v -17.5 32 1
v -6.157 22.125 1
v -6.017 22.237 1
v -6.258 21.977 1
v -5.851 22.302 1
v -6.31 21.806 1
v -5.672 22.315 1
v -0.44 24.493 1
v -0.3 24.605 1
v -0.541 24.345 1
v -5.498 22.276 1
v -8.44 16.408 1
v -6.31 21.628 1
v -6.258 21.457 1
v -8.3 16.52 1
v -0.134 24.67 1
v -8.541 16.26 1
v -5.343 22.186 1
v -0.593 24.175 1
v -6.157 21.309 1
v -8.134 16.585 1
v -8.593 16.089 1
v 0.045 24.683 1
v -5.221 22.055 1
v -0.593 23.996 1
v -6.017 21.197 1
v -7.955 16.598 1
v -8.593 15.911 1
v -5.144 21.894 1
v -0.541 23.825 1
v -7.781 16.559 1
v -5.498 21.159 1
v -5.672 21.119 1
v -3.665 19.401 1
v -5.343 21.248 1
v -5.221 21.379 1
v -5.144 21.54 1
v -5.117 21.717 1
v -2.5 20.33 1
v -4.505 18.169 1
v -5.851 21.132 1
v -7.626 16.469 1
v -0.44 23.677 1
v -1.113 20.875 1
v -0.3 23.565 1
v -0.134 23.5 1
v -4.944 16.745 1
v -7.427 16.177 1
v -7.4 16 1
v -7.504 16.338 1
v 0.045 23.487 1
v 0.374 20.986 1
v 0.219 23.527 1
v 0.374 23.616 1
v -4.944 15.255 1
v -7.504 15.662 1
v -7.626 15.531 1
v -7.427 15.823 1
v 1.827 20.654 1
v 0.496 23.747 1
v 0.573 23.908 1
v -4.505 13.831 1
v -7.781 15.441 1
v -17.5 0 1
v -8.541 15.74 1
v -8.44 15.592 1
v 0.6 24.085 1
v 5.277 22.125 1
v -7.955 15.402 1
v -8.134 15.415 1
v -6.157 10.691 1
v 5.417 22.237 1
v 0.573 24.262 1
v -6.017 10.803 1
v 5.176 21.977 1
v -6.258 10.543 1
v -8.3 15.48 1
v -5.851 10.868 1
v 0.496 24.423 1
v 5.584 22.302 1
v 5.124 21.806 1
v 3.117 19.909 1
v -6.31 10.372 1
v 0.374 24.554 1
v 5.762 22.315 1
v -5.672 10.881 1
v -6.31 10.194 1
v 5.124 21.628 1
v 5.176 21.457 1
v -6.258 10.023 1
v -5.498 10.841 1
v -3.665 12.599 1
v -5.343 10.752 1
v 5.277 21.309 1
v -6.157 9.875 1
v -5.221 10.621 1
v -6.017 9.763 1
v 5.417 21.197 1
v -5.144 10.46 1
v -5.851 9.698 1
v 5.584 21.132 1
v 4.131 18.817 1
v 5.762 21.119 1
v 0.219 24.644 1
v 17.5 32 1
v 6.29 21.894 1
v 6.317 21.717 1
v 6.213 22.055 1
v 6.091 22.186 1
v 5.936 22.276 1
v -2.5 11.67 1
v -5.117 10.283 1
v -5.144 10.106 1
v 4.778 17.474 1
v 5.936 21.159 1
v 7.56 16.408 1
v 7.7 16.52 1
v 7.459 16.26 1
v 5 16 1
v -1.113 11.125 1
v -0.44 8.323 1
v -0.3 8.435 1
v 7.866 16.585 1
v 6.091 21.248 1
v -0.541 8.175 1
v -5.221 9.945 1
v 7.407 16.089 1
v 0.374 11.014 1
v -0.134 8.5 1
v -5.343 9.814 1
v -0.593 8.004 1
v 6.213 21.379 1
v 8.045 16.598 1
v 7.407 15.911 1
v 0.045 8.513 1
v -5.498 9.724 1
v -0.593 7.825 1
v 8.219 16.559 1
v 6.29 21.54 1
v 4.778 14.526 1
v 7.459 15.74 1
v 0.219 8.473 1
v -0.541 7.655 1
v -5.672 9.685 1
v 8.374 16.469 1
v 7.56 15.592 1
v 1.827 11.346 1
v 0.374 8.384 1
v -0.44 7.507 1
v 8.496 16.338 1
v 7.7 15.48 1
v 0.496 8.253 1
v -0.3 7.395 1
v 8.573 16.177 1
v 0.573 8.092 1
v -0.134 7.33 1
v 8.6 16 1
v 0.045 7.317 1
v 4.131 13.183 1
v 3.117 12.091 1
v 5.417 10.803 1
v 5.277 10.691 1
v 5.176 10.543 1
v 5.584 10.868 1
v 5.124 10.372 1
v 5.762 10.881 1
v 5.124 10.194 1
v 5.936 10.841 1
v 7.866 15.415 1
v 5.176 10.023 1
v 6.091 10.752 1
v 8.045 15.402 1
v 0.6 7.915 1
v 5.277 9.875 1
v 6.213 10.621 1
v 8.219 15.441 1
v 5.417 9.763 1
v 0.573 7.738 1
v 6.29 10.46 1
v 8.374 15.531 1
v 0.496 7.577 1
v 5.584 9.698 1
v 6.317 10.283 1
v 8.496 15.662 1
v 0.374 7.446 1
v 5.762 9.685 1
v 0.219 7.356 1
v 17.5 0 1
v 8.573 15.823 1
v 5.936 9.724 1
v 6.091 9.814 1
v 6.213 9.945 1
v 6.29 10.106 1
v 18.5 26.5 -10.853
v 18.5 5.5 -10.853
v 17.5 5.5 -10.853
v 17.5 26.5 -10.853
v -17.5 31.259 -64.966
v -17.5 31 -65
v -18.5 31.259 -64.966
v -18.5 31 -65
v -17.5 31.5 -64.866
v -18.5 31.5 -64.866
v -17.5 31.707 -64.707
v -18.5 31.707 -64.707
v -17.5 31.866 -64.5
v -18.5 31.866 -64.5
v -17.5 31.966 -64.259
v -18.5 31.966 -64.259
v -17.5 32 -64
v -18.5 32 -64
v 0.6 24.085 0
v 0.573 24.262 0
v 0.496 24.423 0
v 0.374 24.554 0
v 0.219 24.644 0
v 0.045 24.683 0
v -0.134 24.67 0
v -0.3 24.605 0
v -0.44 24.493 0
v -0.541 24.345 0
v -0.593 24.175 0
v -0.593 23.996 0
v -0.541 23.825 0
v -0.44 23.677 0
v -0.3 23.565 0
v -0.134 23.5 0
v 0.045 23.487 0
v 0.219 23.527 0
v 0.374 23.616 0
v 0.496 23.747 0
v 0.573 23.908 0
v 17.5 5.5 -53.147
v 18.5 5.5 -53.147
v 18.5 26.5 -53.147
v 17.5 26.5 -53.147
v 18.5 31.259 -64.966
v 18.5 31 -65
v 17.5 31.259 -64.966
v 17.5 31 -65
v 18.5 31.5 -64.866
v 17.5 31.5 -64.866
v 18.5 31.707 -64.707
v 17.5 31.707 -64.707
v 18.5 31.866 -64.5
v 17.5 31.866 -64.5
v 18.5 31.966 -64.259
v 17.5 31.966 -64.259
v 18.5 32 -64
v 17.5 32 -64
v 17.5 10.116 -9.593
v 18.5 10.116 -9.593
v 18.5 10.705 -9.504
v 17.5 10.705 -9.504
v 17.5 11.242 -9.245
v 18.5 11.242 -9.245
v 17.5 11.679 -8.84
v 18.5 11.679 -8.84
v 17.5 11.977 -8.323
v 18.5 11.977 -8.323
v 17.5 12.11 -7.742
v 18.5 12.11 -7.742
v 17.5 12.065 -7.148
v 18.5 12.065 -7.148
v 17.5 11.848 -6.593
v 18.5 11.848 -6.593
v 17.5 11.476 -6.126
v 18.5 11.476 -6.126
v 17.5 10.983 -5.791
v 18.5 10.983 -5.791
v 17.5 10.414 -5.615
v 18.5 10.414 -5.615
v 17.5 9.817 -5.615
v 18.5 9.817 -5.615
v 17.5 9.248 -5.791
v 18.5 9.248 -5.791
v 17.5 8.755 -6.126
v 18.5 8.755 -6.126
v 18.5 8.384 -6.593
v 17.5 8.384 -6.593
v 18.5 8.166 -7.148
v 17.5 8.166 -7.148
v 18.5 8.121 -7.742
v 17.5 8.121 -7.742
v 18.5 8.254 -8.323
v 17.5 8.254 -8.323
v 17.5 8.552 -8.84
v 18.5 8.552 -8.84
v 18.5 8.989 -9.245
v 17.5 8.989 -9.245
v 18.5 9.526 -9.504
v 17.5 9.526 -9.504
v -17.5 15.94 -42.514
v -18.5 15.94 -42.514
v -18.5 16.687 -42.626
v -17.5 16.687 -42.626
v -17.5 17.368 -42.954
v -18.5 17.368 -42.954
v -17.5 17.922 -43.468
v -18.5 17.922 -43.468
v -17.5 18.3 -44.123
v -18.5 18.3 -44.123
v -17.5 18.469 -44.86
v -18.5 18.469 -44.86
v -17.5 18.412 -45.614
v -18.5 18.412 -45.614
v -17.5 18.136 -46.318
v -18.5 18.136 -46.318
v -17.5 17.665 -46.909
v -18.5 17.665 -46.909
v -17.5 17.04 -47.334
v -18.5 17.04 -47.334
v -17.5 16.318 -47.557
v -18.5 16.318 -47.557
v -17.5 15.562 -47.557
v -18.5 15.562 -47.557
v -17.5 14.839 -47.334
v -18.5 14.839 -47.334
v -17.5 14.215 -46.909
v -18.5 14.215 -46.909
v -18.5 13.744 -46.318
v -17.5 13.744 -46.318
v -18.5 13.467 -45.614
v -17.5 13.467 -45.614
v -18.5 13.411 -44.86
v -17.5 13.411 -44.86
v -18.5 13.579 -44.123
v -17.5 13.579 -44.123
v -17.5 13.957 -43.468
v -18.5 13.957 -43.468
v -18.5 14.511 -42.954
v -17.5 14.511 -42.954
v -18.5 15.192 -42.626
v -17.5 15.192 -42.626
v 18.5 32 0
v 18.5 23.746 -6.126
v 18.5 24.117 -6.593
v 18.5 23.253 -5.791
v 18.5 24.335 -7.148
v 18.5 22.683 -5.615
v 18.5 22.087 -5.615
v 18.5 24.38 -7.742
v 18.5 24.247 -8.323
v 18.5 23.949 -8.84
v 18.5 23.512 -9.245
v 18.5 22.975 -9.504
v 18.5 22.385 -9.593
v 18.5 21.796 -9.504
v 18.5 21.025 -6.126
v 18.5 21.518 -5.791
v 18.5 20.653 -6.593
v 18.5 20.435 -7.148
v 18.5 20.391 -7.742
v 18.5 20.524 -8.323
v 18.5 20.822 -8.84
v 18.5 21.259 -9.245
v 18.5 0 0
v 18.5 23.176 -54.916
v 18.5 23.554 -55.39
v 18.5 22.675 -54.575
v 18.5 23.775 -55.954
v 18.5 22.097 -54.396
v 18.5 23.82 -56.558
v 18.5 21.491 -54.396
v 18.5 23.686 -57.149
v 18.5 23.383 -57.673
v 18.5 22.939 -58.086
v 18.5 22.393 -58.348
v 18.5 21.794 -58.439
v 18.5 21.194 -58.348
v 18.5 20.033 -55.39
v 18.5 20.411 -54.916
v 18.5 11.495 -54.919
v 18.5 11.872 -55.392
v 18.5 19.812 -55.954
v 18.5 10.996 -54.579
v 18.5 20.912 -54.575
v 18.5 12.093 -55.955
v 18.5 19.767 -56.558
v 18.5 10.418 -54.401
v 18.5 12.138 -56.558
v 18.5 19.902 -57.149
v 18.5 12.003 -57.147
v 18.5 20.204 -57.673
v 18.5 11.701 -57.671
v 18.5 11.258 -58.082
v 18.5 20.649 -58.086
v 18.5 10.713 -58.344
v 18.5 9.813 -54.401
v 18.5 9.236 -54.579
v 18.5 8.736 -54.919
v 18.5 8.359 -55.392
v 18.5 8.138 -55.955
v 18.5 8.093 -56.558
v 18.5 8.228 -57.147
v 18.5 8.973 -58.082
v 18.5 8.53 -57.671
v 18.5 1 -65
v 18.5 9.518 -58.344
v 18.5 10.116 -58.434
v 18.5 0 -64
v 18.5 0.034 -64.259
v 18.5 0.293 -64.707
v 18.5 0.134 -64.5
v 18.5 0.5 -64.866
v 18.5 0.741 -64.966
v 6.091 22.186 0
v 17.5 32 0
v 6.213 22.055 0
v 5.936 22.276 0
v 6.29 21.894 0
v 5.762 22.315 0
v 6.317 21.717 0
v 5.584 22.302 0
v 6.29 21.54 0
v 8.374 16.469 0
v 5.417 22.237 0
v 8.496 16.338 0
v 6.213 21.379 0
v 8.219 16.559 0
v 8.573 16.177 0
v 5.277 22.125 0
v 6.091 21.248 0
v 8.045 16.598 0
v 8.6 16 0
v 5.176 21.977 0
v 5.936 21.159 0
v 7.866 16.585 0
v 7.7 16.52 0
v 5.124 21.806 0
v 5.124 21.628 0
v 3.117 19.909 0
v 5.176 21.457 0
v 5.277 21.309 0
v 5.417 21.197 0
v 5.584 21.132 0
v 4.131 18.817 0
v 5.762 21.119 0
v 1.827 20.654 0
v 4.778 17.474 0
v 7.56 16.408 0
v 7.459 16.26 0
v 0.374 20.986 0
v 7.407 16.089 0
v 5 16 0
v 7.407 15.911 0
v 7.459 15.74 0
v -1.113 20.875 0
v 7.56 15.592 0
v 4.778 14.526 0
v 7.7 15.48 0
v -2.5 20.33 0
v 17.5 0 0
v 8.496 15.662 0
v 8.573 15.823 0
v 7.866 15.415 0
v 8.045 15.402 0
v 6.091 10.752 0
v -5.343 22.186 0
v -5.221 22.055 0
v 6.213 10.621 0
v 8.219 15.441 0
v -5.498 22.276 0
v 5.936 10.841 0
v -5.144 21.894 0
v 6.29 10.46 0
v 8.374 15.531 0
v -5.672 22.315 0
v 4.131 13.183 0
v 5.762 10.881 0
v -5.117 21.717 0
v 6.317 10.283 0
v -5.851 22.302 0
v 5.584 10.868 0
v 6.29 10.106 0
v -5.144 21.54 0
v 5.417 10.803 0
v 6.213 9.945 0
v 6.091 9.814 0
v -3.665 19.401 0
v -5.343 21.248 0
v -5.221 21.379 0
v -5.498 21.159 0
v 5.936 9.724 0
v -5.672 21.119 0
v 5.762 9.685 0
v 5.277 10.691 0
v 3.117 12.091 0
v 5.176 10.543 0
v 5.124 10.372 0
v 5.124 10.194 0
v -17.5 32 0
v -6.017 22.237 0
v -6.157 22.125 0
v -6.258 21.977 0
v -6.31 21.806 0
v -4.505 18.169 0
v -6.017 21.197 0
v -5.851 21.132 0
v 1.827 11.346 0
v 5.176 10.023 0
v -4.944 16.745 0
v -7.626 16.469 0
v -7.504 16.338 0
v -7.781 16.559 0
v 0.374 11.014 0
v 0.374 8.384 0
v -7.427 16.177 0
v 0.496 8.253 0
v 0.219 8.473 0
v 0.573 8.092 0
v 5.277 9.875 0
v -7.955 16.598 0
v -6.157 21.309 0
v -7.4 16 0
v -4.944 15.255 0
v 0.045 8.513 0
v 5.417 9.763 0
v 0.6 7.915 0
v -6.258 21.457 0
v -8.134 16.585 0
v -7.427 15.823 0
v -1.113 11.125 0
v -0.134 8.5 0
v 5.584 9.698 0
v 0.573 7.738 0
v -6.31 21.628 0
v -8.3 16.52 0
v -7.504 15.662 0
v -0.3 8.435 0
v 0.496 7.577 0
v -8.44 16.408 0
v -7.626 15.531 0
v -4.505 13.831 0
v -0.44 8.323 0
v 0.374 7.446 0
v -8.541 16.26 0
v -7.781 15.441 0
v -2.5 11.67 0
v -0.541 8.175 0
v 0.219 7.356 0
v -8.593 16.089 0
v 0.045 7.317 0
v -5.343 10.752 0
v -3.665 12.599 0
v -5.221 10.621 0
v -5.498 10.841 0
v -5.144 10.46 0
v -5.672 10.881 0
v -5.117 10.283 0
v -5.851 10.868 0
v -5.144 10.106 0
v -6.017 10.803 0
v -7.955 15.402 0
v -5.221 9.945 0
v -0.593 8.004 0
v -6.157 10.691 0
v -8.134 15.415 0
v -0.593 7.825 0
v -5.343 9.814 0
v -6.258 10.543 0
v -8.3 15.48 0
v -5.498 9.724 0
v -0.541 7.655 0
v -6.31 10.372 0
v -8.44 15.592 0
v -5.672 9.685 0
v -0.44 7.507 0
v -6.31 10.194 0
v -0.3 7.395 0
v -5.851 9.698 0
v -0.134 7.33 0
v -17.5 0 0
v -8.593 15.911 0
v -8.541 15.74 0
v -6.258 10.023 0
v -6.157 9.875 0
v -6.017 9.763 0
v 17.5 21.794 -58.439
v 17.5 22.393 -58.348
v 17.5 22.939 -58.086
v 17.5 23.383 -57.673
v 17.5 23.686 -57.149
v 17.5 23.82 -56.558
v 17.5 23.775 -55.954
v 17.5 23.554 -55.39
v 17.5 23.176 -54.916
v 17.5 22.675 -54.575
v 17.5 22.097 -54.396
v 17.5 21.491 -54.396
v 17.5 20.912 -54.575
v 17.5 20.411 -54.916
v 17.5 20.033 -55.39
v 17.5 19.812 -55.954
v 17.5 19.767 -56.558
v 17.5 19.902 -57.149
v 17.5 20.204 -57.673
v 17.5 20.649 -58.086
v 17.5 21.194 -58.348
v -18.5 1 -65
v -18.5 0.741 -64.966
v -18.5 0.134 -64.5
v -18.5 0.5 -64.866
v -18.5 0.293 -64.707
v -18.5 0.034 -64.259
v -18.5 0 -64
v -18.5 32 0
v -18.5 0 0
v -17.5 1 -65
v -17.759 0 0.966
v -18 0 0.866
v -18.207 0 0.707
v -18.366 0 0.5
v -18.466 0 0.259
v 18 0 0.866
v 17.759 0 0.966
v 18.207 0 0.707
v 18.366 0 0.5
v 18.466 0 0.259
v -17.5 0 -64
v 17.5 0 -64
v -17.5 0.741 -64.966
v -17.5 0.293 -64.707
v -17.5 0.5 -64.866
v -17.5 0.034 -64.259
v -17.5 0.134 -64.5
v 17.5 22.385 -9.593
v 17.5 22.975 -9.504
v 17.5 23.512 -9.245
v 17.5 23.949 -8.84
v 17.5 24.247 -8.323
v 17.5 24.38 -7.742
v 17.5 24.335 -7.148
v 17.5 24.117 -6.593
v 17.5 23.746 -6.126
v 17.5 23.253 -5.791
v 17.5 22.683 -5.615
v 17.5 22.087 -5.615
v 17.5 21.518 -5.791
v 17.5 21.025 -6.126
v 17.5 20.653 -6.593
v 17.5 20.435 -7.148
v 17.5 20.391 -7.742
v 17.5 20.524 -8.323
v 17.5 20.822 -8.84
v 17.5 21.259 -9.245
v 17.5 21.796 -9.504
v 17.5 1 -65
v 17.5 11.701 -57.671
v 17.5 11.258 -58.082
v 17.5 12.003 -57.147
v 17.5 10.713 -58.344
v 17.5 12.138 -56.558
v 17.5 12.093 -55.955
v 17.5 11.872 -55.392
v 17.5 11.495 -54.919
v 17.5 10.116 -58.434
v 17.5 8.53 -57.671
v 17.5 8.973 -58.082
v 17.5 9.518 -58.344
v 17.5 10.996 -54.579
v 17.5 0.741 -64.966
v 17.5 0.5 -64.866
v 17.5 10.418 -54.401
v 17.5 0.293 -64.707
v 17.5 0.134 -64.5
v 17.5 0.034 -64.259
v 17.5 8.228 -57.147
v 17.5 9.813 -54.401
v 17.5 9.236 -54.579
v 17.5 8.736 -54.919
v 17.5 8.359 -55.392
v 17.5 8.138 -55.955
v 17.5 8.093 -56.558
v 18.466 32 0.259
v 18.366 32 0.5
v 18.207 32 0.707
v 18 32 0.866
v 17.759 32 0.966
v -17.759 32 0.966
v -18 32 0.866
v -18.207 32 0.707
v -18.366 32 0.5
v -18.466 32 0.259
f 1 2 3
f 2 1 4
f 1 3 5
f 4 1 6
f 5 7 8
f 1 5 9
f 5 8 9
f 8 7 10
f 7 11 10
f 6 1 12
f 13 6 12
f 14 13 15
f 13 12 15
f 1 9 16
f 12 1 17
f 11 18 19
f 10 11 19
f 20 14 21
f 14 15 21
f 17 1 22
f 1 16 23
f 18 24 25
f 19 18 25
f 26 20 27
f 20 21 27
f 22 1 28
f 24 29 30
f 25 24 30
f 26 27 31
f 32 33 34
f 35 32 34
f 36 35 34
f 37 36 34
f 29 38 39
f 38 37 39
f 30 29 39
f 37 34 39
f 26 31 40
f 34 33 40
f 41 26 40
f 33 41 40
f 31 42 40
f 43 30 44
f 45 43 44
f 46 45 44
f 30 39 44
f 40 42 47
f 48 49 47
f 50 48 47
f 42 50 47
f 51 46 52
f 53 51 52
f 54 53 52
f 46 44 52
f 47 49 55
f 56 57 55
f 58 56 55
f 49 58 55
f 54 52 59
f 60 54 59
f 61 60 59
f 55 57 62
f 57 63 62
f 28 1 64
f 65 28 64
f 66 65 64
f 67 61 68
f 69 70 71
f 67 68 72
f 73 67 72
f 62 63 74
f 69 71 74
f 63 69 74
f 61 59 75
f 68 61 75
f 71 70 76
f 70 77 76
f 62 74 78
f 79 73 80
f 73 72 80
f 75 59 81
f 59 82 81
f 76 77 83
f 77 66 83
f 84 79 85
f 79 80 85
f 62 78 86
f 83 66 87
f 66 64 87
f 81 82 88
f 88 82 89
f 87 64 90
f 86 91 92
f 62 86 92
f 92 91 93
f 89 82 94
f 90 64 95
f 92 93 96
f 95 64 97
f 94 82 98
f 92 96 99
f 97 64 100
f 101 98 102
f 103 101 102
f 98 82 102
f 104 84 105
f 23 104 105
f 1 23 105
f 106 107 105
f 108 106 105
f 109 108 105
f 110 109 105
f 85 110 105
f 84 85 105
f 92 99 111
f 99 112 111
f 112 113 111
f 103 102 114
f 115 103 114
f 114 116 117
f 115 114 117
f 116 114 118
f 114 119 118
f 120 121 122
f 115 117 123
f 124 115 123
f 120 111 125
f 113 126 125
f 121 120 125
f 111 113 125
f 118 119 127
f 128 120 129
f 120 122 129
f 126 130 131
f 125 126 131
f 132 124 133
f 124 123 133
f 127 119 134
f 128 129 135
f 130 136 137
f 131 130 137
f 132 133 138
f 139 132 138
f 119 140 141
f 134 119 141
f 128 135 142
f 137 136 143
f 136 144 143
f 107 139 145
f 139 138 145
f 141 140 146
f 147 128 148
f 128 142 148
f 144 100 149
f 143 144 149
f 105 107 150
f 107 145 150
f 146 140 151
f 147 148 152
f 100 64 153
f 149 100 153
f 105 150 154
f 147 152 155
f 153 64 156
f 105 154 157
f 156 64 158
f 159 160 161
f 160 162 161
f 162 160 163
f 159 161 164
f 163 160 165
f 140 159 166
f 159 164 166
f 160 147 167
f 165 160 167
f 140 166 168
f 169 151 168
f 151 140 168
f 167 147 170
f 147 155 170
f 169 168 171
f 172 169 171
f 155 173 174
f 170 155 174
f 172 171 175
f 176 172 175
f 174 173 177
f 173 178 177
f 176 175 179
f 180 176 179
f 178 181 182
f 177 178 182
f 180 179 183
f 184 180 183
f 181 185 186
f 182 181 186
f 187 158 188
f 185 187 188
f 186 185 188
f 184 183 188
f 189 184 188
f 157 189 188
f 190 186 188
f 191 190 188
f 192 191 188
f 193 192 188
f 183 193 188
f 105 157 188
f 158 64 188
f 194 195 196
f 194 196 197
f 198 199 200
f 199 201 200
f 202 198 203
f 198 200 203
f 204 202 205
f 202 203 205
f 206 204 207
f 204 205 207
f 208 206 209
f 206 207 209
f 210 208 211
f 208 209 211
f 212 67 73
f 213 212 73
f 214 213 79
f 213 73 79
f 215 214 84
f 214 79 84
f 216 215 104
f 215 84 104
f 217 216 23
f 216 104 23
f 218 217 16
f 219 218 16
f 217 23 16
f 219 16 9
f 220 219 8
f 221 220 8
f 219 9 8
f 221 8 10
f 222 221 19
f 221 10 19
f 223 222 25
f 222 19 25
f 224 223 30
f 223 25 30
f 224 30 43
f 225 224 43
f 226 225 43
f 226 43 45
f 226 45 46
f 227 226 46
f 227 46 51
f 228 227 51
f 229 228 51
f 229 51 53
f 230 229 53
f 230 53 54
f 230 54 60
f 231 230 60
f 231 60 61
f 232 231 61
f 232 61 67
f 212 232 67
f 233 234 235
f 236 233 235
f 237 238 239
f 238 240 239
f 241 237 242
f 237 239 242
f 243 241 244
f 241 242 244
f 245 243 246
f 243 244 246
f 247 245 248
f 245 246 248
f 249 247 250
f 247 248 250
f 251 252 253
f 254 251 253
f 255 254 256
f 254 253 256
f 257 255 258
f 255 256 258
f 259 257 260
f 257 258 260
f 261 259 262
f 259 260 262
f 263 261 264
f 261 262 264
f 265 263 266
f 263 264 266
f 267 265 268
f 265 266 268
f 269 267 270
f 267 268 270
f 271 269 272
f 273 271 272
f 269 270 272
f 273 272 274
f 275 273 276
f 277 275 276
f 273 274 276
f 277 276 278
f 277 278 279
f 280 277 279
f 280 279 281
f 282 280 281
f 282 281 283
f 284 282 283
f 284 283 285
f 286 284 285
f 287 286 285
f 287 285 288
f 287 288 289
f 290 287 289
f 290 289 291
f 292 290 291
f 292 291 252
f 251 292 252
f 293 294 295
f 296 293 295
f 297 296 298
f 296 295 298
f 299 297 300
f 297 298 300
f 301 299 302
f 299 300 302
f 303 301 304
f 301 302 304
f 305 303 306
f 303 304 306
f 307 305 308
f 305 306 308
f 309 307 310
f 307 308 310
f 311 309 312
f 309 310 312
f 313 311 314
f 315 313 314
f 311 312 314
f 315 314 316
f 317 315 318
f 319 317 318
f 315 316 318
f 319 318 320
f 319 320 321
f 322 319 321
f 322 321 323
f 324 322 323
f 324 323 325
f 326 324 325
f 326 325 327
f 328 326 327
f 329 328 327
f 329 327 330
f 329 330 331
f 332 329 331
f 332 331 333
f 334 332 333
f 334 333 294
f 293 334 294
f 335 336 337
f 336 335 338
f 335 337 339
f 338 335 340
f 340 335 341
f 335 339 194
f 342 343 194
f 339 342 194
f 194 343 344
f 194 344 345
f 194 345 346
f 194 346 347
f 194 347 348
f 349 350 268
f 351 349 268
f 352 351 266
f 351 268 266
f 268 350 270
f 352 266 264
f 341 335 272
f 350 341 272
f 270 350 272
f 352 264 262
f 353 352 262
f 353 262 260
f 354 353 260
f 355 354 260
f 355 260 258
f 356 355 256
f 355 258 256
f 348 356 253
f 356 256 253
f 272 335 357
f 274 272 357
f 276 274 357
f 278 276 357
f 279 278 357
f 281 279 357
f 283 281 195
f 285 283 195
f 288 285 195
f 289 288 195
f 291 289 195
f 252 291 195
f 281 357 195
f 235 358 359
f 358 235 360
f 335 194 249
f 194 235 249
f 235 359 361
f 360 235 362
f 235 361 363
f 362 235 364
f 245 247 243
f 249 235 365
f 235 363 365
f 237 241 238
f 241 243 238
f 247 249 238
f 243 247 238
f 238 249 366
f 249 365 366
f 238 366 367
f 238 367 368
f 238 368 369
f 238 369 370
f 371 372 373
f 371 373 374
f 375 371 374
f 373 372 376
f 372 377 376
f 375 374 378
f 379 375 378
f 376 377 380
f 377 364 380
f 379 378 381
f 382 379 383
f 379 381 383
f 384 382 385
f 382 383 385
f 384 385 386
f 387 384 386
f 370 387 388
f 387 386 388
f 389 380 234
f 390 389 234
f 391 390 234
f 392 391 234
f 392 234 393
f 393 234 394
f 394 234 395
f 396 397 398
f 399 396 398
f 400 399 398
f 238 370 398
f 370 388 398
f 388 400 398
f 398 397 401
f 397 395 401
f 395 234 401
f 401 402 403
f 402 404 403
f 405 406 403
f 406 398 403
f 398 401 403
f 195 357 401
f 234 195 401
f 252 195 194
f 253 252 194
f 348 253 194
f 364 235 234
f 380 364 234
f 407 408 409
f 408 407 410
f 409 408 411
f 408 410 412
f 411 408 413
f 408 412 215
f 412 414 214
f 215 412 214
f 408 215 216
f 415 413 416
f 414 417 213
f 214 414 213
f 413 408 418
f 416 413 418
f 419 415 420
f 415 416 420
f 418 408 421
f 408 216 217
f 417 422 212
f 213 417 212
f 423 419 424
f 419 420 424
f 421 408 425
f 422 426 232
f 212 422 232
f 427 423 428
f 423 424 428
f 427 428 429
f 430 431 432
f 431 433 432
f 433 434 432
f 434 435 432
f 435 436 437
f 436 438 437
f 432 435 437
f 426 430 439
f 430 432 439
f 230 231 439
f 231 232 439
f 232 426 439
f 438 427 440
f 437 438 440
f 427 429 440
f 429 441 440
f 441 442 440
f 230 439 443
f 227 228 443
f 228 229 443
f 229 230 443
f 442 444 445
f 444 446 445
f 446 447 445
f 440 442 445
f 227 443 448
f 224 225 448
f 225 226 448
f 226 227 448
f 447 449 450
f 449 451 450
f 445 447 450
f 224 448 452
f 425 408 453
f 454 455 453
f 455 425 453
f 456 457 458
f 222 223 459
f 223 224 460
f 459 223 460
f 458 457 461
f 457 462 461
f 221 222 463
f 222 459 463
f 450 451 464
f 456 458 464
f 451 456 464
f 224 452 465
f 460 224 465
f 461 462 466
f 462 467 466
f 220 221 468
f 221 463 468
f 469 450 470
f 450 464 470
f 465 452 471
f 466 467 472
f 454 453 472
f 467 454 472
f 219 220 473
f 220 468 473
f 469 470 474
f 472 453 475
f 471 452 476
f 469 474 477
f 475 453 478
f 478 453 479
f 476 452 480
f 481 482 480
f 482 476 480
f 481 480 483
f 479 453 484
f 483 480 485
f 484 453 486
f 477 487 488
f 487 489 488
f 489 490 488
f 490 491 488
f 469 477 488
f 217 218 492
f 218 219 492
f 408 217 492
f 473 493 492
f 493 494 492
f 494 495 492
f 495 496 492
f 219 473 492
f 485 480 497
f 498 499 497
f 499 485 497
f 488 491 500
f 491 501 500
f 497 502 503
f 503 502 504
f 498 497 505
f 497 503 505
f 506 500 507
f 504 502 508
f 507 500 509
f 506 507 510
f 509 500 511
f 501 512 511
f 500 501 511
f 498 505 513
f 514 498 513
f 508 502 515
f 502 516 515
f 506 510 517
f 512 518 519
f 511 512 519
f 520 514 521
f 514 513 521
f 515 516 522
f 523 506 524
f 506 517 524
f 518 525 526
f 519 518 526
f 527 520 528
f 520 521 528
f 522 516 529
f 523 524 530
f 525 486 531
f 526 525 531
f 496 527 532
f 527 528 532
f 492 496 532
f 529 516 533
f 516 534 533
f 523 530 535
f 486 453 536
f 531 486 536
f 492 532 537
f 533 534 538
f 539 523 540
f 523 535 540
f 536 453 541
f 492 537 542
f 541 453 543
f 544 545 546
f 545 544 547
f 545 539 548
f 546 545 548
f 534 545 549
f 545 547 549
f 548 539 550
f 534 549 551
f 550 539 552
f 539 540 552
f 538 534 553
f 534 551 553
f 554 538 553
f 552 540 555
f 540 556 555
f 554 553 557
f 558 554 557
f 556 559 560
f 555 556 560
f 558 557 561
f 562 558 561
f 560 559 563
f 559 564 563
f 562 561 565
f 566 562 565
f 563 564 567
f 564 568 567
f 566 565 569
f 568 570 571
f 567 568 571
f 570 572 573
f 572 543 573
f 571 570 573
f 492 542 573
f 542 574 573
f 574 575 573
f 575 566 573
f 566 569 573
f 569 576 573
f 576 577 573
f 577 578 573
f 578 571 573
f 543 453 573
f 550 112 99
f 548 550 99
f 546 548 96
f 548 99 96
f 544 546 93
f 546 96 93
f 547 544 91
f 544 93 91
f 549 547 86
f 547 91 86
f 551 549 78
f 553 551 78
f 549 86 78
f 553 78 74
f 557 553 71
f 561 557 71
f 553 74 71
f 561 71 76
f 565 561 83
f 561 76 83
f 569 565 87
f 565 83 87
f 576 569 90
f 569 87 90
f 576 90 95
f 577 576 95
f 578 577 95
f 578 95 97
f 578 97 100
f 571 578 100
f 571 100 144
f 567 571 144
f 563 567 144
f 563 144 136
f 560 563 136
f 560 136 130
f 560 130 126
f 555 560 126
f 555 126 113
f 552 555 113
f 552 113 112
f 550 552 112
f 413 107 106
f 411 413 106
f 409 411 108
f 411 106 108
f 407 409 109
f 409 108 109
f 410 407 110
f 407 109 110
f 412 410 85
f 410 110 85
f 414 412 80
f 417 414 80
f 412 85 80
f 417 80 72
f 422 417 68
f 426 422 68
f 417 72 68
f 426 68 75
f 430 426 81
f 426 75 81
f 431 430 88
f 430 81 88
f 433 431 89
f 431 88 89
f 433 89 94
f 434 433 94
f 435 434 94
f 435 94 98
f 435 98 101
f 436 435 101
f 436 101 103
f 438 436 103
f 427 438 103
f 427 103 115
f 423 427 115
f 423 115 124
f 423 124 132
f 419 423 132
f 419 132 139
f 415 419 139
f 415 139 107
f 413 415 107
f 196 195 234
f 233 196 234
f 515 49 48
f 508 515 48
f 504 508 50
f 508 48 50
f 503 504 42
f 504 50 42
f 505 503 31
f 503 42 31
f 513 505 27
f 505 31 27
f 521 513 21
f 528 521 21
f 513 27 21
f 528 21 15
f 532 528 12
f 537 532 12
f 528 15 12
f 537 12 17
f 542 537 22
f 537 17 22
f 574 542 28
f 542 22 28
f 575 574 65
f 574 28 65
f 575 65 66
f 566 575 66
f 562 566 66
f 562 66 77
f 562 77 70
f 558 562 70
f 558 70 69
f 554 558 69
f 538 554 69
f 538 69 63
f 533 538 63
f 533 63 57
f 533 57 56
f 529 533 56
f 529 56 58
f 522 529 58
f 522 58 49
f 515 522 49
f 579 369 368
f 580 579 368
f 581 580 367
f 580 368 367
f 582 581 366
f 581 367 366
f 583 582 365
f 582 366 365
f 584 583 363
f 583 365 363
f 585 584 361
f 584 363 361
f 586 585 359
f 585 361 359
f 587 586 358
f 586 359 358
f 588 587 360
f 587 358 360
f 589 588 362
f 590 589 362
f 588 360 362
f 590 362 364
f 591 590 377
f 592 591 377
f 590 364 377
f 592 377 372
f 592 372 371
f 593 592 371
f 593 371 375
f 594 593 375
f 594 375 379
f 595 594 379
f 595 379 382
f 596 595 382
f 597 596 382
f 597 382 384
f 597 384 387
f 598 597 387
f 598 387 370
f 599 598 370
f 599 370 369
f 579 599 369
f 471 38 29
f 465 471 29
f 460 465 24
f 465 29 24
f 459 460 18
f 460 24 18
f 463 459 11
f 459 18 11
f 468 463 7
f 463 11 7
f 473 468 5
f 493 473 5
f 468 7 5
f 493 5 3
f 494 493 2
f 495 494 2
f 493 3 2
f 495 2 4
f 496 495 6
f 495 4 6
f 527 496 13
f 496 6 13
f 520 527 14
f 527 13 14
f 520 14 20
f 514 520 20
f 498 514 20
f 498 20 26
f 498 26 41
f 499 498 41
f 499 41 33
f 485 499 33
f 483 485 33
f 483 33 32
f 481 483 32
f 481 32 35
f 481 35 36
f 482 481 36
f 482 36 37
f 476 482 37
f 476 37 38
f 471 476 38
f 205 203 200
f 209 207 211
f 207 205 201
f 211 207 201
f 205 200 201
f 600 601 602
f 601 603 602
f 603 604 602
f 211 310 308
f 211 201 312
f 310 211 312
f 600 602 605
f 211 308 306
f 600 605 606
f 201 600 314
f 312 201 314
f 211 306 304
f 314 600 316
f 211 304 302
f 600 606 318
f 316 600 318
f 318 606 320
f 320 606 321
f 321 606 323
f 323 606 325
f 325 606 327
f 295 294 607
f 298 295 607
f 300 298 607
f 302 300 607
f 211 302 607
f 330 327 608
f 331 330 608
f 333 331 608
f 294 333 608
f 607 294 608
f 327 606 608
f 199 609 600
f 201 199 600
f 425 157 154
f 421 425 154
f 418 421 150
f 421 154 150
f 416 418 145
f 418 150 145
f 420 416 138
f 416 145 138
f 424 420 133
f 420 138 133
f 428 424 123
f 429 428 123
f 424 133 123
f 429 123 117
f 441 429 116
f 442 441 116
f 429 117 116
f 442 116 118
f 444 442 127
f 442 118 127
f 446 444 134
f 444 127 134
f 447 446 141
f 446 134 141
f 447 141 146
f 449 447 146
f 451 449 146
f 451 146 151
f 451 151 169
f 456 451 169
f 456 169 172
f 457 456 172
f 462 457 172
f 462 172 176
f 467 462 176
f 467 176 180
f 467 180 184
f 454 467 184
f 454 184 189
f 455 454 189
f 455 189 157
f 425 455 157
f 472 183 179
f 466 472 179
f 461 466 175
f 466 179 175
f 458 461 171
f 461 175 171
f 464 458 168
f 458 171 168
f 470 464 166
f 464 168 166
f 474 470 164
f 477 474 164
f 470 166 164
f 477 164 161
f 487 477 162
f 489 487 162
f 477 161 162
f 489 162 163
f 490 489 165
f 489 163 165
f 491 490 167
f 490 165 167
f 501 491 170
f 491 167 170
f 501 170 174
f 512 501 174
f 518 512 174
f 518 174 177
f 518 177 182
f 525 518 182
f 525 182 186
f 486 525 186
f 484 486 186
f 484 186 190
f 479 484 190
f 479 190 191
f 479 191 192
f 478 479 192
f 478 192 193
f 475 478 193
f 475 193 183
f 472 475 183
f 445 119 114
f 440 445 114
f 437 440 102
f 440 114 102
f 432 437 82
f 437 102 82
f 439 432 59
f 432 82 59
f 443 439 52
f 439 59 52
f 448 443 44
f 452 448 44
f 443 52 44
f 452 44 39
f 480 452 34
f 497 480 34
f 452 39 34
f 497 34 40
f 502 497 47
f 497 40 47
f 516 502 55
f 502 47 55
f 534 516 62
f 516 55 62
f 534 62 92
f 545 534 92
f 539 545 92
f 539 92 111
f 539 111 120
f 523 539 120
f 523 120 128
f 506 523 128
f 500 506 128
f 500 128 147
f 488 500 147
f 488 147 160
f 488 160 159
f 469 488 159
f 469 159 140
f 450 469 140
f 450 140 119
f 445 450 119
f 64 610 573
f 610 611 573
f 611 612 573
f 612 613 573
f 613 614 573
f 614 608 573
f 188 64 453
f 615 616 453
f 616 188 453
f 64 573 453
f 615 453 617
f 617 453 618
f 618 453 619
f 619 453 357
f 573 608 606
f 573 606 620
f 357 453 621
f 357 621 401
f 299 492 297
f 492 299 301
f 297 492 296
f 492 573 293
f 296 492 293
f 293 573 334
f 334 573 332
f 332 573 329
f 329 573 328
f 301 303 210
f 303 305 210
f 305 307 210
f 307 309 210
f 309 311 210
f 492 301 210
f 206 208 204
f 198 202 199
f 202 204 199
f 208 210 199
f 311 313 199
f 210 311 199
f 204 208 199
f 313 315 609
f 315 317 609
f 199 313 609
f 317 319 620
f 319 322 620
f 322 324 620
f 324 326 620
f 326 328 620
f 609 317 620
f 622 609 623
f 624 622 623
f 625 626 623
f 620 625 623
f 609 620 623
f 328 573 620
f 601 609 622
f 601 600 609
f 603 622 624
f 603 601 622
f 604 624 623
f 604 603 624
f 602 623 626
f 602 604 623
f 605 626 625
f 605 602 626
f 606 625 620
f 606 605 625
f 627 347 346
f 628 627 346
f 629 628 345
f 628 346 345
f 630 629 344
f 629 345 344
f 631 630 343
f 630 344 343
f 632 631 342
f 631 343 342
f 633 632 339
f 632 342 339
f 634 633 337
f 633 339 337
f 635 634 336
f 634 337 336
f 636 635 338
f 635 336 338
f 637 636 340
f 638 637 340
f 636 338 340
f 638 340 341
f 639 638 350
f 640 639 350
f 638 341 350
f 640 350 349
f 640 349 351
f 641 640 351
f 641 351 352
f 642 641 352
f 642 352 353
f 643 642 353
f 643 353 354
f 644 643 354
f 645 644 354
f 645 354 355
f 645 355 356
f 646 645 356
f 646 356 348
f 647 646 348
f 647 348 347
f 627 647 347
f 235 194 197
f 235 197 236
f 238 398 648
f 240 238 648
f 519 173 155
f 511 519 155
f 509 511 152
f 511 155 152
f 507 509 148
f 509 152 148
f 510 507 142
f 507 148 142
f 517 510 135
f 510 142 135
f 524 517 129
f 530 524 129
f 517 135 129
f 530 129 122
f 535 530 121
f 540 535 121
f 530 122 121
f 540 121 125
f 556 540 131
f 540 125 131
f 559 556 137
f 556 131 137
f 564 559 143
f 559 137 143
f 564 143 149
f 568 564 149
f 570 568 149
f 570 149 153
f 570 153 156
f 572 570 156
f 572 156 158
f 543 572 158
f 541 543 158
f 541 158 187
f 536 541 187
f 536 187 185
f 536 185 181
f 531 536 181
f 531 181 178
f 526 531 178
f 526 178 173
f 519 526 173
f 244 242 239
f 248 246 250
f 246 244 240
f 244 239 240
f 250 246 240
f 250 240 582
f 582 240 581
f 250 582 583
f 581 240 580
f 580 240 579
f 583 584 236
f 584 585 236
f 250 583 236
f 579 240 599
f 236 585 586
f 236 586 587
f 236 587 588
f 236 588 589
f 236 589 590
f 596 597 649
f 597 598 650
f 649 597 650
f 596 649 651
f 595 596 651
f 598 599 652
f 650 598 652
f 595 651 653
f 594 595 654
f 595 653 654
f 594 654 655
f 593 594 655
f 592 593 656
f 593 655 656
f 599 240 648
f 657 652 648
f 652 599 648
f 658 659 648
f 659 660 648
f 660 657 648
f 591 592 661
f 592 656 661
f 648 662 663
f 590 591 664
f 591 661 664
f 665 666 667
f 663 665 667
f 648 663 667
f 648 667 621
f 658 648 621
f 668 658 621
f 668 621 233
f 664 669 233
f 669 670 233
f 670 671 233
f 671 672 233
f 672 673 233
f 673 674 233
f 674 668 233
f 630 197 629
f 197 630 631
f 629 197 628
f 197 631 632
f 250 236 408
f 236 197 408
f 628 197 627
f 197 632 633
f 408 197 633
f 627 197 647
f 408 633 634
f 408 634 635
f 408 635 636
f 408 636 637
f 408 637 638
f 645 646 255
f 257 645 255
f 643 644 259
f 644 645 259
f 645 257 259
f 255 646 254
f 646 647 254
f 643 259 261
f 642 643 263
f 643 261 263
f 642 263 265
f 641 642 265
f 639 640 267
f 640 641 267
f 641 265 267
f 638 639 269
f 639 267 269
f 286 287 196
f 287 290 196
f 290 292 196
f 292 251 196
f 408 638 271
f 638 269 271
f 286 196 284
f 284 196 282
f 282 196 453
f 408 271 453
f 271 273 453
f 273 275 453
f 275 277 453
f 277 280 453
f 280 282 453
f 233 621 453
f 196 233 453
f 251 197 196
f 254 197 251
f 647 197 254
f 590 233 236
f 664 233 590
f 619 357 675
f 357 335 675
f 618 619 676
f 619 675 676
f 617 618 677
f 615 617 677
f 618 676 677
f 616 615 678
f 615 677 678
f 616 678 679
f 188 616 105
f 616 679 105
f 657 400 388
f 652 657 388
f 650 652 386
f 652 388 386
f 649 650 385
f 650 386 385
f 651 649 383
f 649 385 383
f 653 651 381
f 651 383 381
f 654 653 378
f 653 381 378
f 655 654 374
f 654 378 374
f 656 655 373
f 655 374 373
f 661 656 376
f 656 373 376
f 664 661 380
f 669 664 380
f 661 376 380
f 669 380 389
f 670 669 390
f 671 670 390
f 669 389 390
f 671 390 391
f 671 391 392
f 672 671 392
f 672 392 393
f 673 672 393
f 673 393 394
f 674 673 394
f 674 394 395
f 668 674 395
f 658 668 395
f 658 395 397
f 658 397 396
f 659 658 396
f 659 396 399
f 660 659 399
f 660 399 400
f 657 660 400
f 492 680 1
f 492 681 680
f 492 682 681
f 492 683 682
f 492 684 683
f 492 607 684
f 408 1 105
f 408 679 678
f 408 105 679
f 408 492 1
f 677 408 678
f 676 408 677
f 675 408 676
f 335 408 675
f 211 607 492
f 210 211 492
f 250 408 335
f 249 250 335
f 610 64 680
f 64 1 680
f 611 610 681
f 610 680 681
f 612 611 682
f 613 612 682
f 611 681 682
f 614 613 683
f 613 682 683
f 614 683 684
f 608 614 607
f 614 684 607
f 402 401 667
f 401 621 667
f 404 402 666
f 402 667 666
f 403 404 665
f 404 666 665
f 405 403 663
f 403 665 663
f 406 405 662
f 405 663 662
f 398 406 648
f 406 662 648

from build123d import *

# Parameters (mm, degrees)
EXTRUDE_THIN2_DEPTH = 32
FILLET4_R           = 1
FILLET5_R           = 1
FILLET6_R           = 1
FILLET7_R           = 1
FILLET8_R           = 1
FILLET9_R           = 1
SKETCH9_W           = 42.294810508
SKETCH9_H           = 21
CUT_EXTRUDE2_DEPTH  = 32
SKETCH10_R          = 5
CUT_EXTRUDE3_DEPTH  = 32
SKETCH14_R          = 0.6
CUT_EXTRUDE7_DEPTH  = 32
SKETCH15_R          = 0.6
CUT_EXTRUDE8_DEPTH  = 10
SKETCH13_R          = 2.535991587
CUT_EXTRUDE9_DEPTH  = 10
SKETCH11_R          = 2.032571361
SKETCH11_R_2        = 2.028056202
CUT_EXTRUDE12_DEPTH = 10
SKETCH16_R          = 2
CUT_EXTRUDE13_DEPTH = 10


with BuildPart() as part:
    # Sketch8 → Extrude-Thin2 (new body)
    with BuildSketch(Plane(origin=(0, 0, 0), x_dir=(1, 0, 0), z_dir=(0, 1, 0))):
        Polygon((17.5, 65), (17.5, 0), (-17.5, 0), (-17.5, 65), (-18.5, 65), (-18.5, -1), (18.5, -1), (18.5, 65), align=None)
    extrude(amount=EXTRUDE_THIN2_DEPTH)

    # Fillet4
    fillet4_edges = [part.edges().sort_by_distance(p)[0] for p in [
        (-18, 0, -65),
    ]]
    fillet(fillet4_edges, radius=FILLET4_R)

    # Fillet5
    fillet5_edges = [part.edges().sort_by_distance(p)[0] for p in [
        (-18, 32, -65),
    ]]
    fillet(fillet5_edges, radius=FILLET5_R)

    # Fillet6
    fillet6_edges = [part.edges().sort_by_distance(p)[0] for p in [
        (18, 0, -65),
    ]]
    fillet(fillet6_edges, radius=FILLET6_R)

    # Fillet7
    fillet7_edges = [part.edges().sort_by_distance(p)[0] for p in [
        (18, 32, -65),
    ]]
    fillet(fillet7_edges, radius=FILLET7_R)

    # Fillet8
    fillet8_edges = [part.edges().sort_by_distance(p)[0] for p in [
        (18.5, 16, 1),
    ]]
    fillet(fillet8_edges, radius=FILLET8_R)

    # Fillet9
    fillet9_edges = [part.edges().sort_by_distance(p)[0] for p in [
        (-18.5, 16, 1),
    ]]
    fillet(fillet9_edges, radius=FILLET9_R)

    # Sketch9 → Cut-Extrude2 (cut)
    with BuildSketch(Plane(origin=(18.5, 0, 0), x_dir=(0, 0, -1), z_dir=(1, 0, 0))):
        with Locations((32, 16)):
            Rectangle(SKETCH9_W, SKETCH9_H)
    extrude(amount=-CUT_EXTRUDE2_DEPTH, mode=Mode.SUBTRACT)

    # Sketch10 → Cut-Extrude3 (cut)
    with BuildSketch(Plane.XY.offset(1)):
        with Locations((0, 16)):
            Circle(SKETCH10_R)
    extrude(amount=-CUT_EXTRUDE3_DEPTH, mode=Mode.SUBTRACT)

    # Sketch14 → Cut-Extrude7 (cut)
    with BuildSketch(Plane.XY.offset(1)):
        with Locations((0, 7.914892415)):
            Circle(SKETCH14_R)
        with Locations((0, 24.085107585)):
            Circle(SKETCH14_R)
        with Locations((-5.7170344, 10.2829656)):
            Circle(SKETCH14_R)
        with Locations((-5.7170344, 21.7170344)):
            Circle(SKETCH14_R)
        with Locations((5.7170344, 10.2829656)):
            Circle(SKETCH14_R)
        with Locations((5.7170344, 21.7170344)):
            Circle(SKETCH14_R)
    extrude(amount=-CUT_EXTRUDE7_DEPTH, mode=Mode.SUBTRACT)

    # Sketch15 → Cut-Extrude8 (cut)
    with BuildSketch(Plane.XY.offset(1)):
        with Locations((-8, 16)):
            Circle(SKETCH15_R)
        with Locations((8, 16)):
            Circle(SKETCH15_R)
    extrude(amount=-CUT_EXTRUDE8_DEPTH, mode=Mode.SUBTRACT)

    # Sketch13 → Cut-Extrude9 (cut)
    with BuildSketch(Plane.ZY.offset(18.5)):
        with Locations((-45.049639152, 15.939767339)):
            Circle(SKETCH13_R)
    extrude(amount=-CUT_EXTRUDE9_DEPTH, mode=Mode.SUBTRACT)

    # Sketch11 → Cut-Extrude12 (cut)
    with BuildSketch(Plane(origin=(18.5, 0, 0), x_dir=(0, 0, -1), z_dir=(1, 0, 0))):
        with Locations((56.406137915, 21.793575716)):
            Circle(SKETCH11_R)
        with Locations((56.406137915, 10.115569331)):
            Circle(SKETCH11_R_2)
    extrude(amount=-CUT_EXTRUDE12_DEPTH, mode=Mode.SUBTRACT)

    # Sketch16 → Cut-Extrude13 (cut)
    with BuildSketch(Plane(origin=(18.5, 0, 0), x_dir=(0, 0, -1), z_dir=(1, 0, 0))):
        with Locations((7.592594746, 22.385297204)):
            Circle(SKETCH16_R)
        with Locations((7.592594746, 10.115569331)):
            Circle(SKETCH16_R)
    extrude(amount=-CUT_EXTRUDE13_DEPTH, mode=Mode.SUBTRACT)


solid = part.part
